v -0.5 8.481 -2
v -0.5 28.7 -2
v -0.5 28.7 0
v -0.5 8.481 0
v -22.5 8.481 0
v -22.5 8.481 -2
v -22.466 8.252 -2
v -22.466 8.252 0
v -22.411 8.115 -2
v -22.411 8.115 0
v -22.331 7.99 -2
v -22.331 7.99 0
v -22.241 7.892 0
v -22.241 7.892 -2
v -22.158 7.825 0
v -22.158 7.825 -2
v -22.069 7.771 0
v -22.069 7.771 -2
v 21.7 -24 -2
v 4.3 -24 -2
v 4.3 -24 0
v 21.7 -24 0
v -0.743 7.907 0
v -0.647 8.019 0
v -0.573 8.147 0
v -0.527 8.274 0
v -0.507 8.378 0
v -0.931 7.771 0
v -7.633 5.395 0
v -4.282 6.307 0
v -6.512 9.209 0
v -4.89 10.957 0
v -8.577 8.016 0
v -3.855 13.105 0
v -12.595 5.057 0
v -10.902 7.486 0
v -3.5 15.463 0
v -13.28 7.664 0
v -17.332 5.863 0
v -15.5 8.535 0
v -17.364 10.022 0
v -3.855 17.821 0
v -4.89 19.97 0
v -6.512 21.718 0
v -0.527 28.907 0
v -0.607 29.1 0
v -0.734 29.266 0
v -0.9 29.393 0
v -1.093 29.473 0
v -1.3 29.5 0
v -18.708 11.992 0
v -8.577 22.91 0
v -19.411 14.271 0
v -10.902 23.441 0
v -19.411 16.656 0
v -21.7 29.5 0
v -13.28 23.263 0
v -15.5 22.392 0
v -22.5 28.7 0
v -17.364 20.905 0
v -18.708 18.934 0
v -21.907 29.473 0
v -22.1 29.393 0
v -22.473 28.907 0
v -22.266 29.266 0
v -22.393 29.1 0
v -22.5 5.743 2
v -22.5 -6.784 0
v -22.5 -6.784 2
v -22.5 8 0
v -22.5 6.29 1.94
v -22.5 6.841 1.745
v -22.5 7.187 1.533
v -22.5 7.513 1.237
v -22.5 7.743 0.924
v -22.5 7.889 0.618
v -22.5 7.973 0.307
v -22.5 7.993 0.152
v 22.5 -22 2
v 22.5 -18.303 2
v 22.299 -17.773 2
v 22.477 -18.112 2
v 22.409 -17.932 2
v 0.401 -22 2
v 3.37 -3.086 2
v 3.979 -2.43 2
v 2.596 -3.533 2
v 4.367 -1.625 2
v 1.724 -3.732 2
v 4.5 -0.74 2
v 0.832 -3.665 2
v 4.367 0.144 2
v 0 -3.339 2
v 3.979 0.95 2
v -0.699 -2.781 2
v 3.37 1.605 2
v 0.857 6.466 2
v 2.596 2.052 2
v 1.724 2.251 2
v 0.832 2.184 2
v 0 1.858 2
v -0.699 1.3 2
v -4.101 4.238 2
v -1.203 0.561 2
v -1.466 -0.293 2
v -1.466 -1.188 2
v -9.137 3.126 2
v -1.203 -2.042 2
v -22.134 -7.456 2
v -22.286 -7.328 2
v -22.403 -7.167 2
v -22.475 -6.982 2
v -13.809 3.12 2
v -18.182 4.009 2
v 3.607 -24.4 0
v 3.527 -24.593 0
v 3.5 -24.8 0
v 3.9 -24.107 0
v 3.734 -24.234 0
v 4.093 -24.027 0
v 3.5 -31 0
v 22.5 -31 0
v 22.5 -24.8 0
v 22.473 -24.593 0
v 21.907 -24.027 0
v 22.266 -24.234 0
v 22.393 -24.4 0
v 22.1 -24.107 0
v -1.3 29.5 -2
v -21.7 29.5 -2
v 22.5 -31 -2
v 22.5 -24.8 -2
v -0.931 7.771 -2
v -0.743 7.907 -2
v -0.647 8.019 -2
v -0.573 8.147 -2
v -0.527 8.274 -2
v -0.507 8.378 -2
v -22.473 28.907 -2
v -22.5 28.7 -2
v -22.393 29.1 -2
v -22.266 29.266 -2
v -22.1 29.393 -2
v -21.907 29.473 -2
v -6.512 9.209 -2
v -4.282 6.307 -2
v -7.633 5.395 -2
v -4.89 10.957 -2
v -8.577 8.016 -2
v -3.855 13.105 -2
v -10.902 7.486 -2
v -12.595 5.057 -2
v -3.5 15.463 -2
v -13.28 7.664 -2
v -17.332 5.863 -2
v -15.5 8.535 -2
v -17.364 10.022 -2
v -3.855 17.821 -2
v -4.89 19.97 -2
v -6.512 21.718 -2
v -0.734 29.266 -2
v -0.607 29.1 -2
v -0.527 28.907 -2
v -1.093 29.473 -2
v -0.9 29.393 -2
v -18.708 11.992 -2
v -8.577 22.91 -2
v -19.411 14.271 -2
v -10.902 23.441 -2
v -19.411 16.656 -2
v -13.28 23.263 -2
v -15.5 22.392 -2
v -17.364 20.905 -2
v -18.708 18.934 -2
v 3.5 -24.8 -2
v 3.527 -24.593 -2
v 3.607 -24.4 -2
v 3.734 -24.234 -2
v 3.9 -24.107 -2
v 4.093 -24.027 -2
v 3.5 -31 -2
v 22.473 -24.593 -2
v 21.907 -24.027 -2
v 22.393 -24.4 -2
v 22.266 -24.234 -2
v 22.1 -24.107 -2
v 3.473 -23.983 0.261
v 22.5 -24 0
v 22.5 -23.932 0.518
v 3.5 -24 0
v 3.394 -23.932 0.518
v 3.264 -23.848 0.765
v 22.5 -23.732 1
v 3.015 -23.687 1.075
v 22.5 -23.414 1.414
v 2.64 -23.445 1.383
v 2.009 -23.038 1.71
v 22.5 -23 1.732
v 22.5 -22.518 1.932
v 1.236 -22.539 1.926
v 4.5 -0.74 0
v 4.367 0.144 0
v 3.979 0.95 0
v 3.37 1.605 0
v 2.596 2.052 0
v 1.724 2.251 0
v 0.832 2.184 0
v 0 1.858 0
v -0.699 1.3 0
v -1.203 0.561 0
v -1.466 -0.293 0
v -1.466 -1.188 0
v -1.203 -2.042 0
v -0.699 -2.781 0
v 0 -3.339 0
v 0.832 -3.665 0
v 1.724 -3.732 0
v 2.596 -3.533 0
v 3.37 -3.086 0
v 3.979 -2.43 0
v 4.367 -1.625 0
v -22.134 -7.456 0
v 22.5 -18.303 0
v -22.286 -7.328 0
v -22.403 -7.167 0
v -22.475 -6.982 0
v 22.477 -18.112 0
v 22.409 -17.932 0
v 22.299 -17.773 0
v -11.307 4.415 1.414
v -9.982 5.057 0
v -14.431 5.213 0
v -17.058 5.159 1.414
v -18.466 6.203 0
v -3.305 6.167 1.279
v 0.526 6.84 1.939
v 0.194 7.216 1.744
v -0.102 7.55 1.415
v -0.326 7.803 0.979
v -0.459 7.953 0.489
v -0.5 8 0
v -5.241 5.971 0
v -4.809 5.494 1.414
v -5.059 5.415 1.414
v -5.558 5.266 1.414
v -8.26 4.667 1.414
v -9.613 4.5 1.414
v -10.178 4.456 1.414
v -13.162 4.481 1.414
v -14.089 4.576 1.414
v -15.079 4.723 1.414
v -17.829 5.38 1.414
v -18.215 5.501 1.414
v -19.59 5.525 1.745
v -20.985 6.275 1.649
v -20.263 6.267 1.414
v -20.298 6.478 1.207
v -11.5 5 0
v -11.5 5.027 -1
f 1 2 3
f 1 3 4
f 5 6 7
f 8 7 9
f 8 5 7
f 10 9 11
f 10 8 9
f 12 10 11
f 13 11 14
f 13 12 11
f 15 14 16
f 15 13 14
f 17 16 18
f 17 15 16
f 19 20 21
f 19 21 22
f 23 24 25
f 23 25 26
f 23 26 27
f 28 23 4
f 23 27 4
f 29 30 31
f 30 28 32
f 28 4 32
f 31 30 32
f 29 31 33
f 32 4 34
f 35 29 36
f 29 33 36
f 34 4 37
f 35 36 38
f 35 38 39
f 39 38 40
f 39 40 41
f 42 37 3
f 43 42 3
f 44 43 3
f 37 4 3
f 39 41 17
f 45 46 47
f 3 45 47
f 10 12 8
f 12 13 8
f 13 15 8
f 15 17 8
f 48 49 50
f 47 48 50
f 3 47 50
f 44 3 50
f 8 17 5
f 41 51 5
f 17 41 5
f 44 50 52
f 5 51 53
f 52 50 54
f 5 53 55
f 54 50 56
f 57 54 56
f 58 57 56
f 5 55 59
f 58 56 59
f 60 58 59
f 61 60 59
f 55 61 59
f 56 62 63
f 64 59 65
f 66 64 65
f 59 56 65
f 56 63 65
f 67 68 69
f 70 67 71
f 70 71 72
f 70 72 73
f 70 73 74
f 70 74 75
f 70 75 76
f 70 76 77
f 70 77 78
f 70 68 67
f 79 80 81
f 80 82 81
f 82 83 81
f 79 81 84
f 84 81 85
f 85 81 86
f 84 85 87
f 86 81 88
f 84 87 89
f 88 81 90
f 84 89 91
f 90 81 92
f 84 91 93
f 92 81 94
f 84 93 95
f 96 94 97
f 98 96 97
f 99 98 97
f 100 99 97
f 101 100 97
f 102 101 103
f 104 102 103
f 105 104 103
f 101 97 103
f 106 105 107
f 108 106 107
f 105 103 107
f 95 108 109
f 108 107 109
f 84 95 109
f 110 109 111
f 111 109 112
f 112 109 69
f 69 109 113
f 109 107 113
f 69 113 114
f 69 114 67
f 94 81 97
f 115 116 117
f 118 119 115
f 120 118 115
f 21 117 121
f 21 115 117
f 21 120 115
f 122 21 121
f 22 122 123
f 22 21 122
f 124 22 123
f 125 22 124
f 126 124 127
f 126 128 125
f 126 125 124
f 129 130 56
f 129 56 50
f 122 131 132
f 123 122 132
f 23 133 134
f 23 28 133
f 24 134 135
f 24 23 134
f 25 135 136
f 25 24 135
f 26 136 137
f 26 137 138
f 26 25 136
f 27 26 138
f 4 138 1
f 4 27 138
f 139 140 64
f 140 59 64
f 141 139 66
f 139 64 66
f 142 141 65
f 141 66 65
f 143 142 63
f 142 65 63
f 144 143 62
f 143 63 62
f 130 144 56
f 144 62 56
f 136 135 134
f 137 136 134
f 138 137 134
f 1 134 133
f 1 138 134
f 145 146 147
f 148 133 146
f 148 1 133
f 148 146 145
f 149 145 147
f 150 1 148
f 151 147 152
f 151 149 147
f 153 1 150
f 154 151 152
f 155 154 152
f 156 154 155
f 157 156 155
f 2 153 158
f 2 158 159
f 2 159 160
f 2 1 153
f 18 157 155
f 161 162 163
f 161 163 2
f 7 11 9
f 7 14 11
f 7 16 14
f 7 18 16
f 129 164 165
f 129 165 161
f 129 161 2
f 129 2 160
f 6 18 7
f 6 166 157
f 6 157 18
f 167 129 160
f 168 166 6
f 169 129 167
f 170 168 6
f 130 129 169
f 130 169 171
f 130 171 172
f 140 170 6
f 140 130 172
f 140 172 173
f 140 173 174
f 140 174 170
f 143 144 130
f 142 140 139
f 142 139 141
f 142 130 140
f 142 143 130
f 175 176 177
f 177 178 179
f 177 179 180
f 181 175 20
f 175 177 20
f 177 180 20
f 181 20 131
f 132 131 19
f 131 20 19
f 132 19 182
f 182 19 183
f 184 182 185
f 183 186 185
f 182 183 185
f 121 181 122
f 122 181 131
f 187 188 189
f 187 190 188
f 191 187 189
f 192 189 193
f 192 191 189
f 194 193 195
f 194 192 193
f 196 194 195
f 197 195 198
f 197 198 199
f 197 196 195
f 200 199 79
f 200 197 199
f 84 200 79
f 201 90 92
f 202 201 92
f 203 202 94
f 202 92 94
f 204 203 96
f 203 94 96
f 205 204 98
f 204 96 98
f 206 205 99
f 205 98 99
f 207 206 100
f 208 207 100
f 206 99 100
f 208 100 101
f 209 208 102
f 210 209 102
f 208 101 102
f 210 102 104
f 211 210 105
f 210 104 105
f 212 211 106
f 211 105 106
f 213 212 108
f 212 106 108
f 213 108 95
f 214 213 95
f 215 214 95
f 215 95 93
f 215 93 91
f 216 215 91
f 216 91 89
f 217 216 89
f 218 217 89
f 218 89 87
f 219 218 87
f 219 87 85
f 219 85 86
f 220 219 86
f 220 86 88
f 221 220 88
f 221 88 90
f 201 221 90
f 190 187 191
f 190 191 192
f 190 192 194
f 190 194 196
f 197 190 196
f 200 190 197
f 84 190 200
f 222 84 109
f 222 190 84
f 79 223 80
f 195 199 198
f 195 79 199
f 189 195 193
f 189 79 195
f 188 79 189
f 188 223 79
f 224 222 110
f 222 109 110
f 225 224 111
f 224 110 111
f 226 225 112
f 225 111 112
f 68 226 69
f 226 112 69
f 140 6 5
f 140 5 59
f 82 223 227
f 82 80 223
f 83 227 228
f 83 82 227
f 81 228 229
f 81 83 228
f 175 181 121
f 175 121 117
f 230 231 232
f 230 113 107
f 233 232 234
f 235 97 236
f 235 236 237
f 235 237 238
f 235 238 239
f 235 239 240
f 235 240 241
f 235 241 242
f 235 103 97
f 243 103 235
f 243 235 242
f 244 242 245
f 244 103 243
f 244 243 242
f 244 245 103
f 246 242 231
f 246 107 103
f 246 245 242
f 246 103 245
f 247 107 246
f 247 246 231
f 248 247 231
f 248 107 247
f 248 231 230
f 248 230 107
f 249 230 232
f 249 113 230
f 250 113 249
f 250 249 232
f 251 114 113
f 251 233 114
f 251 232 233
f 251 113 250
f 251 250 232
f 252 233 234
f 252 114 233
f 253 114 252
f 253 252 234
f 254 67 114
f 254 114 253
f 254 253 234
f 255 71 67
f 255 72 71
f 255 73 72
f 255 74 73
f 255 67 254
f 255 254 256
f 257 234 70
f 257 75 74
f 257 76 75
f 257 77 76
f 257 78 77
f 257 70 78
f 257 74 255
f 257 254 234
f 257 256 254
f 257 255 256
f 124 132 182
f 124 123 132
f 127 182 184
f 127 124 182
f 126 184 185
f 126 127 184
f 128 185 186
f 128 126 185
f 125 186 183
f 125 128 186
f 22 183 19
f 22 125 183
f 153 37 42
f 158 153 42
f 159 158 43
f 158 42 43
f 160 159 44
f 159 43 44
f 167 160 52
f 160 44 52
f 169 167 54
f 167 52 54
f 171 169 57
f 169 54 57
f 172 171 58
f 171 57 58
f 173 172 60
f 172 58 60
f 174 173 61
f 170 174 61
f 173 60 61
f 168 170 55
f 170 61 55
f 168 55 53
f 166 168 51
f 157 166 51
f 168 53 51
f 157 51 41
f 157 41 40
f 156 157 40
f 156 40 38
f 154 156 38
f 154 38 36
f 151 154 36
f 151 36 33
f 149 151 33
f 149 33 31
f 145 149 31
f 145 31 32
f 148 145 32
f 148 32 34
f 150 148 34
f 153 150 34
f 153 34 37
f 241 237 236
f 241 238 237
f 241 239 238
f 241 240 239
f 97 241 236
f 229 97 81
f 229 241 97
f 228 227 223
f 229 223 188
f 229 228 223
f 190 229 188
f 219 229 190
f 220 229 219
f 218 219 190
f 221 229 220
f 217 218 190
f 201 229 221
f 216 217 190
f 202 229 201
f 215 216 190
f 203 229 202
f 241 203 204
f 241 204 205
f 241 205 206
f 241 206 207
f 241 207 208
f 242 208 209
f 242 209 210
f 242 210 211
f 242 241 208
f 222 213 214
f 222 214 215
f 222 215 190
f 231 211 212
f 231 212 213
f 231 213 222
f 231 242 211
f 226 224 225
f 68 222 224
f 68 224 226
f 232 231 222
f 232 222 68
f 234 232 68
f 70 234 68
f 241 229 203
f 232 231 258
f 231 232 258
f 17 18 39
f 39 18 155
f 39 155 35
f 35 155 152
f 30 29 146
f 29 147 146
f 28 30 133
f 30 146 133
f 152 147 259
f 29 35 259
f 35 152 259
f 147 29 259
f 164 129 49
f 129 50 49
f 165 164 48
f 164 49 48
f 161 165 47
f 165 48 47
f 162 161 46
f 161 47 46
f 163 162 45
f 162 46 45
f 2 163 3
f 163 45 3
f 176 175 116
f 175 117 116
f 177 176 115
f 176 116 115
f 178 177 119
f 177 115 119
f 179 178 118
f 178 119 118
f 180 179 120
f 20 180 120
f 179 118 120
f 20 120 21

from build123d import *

# Parameters (mm, degrees)
BOSS_EXTRUDE1_DEPTH    = 2
SKETCH25_W             = 19
SKETCH25_H             = 7
BOSS_EXTRUDE14_DEPTH   = 2
BOSS_EXTRUDE14_2_DEPTH = 2
SKETCH26_R             = 8
CUT_EXTRUDE4_DEPTH     = 39.356876892
SKETCH27_R             = 3
CUT_EXTRUDE5_DEPTH     = 39.512984892
FILLET6_R              = 2
FILLET7_R              = 0.8
FILLET8_R              = 0.8
FILLET9_R              = 0.8


with BuildPart() as part:
    # Sketch1 → Boss-Extrude1 (new body)
    with BuildSketch(Plane.XY):
        with BuildLine():
            Line((22.5, -18), (22.5, -24))
            Line((22.5, -24), (3.5, -24))
            Line((3.5, -24), (-22.5, -7.22))
            Line((-22.5, -7.22), (-22.5, 8))
            add(Edge.make_bspline(
                [(-0.5, 8), (-11.5, 2), (-22.5, 8)],
                knots=[0, 0, 0, 1, 1, 1], degree=2))
            Line((-0.5, 8), (22.5, -18))
        make_face()
    extrude(amount=BOSS_EXTRUDE1_DEPTH)

    # Sketch27 → Cut-Extrude5 (cut, through all)
    with BuildSketch(Plane.XY.offset(2)):
        with Locations((1.5, -0.740434783)):
            Circle(SKETCH27_R)
    extrude(amount=-CUT_EXTRUDE5_DEPTH, mode=Mode.SUBTRACT)

    # Fillet6
    fillet6_edges = [part.edges().sort_by_distance(p)[0] for p in [
        (13, -24, 2),
        (-11.5, 5, 2),
    ]]
    fillet(fillet6_edges, radius=FILLET6_R - 0.0001)  # a hair under: the kernel refuses the full size

    # Fillet8
    fillet8_edges = [part.edges().sort_by_distance(p)[0] for p in [
        (22.5, -18, 1),
        (-22.5, -7.22, 1),
    ]]
    fillet(fillet8_edges, radius=FILLET8_R)


with BuildPart() as body_2:
    # Sketch25 → Boss-Extrude14 (new body)
    with BuildSketch(Plane.XY.offset(-2)):
        with Locations((13, -27.5)):
            Rectangle(SKETCH25_W, SKETCH25_H)
    extrude(amount=BOSS_EXTRUDE14_DEPTH)

    # Fillet9
    fillet9_edges = [body_2.edges().sort_by_distance(p)[0] for p in [
        (22.5, -24, -1),
        (3.5, -24, -1),
    ]]
    fillet(fillet9_edges, radius=FILLET9_R)


with BuildPart() as body_3:
    # Sketch25 → Boss-Extrude14 2 (new body)
    with BuildSketch(Plane.XY.offset(-2)):
        with BuildLine():
            Line((-22.5, 8), (-22.5, 29.5))
            Line((-22.5, 29.5), (-0.5, 29.5))
            Line((-0.5, 29.5), (-0.5, 8))
            add(Edge.make_bspline(
                [(-22.5, 8), (-11.5, 2.054280429), (-0.5, 8)],
                knots=[0, 0, 0, 1, 1, 1], degree=2))
        make_face()
    extrude(amount=BOSS_EXTRUDE14_2_DEPTH)

    # Sketch26 → Cut-Extrude4 (cut, through all)
    with BuildSketch(Plane.XY):
        with Locations((-11.5, 15.463373966)):
            Circle(SKETCH26_R)
    extrude(amount=-CUT_EXTRUDE4_DEPTH, mode=Mode.SUBTRACT)

    # Fillet7
    fillet7_edges = [body_3.edges().sort_by_distance(p)[0] for p in [
        (-0.5, 8, -1),
        (-22.5, 8, -1),
        (-0.5, 29.5, -1),
        (-22.5, 29.5, -1),
    ]]
    fillet(fillet7_edges, radius=FILLET7_R)


solid = Compound([part.part, body_2.part, body_3.part])
